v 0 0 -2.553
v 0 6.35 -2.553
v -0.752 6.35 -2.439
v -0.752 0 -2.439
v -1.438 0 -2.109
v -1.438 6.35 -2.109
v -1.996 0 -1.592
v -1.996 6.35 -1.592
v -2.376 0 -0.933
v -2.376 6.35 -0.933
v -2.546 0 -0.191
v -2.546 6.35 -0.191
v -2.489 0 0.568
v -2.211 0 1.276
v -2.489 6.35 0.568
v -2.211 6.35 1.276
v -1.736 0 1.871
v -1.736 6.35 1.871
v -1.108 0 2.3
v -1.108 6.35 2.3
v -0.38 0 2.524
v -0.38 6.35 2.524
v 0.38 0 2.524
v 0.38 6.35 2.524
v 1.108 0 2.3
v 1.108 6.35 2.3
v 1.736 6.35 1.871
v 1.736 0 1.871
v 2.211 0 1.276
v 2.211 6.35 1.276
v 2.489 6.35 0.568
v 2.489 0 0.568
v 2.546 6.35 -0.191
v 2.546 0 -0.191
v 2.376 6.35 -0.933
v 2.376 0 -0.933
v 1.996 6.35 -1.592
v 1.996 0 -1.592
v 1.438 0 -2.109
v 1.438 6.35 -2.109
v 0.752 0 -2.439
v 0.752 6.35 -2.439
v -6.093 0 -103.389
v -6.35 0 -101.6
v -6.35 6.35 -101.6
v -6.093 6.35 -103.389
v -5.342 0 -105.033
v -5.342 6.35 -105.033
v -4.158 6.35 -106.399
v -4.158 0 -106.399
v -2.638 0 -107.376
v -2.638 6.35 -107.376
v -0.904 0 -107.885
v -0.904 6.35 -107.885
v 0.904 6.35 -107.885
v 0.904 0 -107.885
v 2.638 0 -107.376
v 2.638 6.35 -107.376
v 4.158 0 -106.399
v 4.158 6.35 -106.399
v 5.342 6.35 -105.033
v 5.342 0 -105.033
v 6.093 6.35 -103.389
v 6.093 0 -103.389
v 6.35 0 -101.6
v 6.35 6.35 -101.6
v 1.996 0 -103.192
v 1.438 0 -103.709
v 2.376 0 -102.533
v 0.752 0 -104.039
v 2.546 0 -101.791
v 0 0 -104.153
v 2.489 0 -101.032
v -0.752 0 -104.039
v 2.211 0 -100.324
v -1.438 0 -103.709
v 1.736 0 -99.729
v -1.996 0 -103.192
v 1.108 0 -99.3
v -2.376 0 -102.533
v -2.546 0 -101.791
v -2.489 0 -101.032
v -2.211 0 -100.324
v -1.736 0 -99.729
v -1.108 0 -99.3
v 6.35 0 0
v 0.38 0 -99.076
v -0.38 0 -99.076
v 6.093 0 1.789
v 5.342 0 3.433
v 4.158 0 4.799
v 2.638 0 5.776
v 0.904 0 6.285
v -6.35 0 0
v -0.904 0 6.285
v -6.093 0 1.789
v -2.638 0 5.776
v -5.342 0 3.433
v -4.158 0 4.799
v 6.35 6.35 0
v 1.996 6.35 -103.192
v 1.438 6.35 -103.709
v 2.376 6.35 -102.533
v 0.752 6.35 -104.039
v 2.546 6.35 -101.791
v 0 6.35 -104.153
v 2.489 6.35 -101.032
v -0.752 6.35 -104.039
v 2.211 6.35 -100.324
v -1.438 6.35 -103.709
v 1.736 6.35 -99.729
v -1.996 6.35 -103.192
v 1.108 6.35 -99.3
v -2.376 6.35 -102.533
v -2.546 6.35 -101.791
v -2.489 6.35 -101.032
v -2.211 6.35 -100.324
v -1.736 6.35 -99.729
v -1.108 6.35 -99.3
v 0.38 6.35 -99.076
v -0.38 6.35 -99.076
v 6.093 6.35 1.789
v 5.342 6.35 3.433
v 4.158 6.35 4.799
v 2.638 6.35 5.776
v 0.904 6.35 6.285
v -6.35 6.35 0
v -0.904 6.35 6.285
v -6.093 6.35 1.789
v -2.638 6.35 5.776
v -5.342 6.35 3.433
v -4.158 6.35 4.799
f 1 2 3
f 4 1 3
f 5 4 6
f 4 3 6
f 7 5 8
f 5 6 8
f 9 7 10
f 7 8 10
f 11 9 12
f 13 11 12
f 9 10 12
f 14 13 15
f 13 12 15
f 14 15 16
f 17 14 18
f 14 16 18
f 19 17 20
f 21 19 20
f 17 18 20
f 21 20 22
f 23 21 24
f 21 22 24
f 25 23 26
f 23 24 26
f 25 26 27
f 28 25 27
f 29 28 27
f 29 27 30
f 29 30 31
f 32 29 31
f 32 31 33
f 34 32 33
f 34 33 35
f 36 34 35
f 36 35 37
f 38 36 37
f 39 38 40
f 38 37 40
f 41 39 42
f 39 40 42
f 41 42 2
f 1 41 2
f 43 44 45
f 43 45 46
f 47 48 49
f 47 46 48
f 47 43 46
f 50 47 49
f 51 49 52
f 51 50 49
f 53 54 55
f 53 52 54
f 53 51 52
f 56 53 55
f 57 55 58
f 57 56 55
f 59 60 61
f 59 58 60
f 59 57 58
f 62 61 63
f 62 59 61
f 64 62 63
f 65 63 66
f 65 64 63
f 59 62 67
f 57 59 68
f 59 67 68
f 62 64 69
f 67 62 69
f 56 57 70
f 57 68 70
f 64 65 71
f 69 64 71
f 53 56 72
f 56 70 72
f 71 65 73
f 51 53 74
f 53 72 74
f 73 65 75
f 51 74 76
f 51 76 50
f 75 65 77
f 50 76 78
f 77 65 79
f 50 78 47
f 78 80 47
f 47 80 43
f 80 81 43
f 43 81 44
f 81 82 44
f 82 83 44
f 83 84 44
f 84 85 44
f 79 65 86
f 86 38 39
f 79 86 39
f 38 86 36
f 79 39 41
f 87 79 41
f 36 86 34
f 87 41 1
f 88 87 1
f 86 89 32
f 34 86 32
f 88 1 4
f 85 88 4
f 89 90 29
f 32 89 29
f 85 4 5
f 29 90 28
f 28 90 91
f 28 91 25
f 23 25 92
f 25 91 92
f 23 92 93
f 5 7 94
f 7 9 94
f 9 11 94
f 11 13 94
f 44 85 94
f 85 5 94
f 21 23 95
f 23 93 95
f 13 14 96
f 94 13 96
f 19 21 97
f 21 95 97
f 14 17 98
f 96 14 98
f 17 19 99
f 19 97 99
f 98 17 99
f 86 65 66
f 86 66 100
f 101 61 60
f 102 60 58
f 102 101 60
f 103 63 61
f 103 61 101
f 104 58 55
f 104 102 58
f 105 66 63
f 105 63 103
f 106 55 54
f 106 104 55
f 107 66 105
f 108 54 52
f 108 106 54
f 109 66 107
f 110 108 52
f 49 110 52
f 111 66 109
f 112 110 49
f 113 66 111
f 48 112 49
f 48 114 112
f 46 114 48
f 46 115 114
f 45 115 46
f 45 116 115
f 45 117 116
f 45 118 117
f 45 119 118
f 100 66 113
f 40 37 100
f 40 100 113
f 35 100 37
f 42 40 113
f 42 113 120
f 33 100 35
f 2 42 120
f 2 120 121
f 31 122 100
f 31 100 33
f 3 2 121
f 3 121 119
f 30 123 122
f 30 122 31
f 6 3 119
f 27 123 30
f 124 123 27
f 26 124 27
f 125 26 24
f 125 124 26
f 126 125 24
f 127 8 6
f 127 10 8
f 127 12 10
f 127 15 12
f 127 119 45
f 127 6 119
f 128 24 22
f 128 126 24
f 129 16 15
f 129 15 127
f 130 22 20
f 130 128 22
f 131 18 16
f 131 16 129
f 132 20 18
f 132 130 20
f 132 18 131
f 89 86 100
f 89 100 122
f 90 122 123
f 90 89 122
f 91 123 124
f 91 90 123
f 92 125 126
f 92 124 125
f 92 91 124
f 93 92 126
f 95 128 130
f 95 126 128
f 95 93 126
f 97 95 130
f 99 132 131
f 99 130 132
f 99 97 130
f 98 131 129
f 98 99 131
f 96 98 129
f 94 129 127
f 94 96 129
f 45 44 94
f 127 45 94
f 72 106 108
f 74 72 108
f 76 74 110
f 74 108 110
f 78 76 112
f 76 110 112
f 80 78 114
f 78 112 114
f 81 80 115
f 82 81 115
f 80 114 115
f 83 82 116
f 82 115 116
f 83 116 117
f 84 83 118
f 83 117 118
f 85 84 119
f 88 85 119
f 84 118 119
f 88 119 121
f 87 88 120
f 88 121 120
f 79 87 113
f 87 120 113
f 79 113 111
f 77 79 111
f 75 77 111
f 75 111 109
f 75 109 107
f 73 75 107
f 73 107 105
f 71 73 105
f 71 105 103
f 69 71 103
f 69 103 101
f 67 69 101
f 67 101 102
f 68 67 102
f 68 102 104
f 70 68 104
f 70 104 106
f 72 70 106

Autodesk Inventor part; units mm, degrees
ref_plane "YZ Plane" through (0, 0, 0) normal (1, 0, 0) x (0, 1, 0)
ref_plane "XZ Plane" through (0, 0, 0) normal (0, 1, 0) x (-1, 0, 0)
ref_plane "XY Plane" through (0, 0, 0) normal (0, 0, 1) x (1, 0, 0)
sketch "Sketch1" plane through (0, 0, 0) normal (0, 1, 0) x (-1, 0, 0)
  circle A0 centre (0, 0) radius 6.35
  circle A1 centre (0, -101.6) radius 6.35
  line L0 (0, 0) -> (0, -109.4726) construction
  line L1 (6.35, -101.6) -> (6.35, 0)
  line L2 (-6.35, -101.6) -> (-6.35, 0)
  dimension "d0" = 101.6
  dimension "d1" = 12.7
  dimension "d2" = 12.7
extrude "Extrusion1" add sketch "Sketch1" along normal blind 6.35
hole "Hole1" at (0, 0, 0) at (0, 0, -101.6) direction (0, 1, 0) diameter 5.1054 depth 13.6144 clearance for "Flat Head Machine Screw (82)" size "#10" standard "Ansi Unified Screw Threads"
chamfer "Chamfer1" [suppressed]
properties part number "Main Linkage"
